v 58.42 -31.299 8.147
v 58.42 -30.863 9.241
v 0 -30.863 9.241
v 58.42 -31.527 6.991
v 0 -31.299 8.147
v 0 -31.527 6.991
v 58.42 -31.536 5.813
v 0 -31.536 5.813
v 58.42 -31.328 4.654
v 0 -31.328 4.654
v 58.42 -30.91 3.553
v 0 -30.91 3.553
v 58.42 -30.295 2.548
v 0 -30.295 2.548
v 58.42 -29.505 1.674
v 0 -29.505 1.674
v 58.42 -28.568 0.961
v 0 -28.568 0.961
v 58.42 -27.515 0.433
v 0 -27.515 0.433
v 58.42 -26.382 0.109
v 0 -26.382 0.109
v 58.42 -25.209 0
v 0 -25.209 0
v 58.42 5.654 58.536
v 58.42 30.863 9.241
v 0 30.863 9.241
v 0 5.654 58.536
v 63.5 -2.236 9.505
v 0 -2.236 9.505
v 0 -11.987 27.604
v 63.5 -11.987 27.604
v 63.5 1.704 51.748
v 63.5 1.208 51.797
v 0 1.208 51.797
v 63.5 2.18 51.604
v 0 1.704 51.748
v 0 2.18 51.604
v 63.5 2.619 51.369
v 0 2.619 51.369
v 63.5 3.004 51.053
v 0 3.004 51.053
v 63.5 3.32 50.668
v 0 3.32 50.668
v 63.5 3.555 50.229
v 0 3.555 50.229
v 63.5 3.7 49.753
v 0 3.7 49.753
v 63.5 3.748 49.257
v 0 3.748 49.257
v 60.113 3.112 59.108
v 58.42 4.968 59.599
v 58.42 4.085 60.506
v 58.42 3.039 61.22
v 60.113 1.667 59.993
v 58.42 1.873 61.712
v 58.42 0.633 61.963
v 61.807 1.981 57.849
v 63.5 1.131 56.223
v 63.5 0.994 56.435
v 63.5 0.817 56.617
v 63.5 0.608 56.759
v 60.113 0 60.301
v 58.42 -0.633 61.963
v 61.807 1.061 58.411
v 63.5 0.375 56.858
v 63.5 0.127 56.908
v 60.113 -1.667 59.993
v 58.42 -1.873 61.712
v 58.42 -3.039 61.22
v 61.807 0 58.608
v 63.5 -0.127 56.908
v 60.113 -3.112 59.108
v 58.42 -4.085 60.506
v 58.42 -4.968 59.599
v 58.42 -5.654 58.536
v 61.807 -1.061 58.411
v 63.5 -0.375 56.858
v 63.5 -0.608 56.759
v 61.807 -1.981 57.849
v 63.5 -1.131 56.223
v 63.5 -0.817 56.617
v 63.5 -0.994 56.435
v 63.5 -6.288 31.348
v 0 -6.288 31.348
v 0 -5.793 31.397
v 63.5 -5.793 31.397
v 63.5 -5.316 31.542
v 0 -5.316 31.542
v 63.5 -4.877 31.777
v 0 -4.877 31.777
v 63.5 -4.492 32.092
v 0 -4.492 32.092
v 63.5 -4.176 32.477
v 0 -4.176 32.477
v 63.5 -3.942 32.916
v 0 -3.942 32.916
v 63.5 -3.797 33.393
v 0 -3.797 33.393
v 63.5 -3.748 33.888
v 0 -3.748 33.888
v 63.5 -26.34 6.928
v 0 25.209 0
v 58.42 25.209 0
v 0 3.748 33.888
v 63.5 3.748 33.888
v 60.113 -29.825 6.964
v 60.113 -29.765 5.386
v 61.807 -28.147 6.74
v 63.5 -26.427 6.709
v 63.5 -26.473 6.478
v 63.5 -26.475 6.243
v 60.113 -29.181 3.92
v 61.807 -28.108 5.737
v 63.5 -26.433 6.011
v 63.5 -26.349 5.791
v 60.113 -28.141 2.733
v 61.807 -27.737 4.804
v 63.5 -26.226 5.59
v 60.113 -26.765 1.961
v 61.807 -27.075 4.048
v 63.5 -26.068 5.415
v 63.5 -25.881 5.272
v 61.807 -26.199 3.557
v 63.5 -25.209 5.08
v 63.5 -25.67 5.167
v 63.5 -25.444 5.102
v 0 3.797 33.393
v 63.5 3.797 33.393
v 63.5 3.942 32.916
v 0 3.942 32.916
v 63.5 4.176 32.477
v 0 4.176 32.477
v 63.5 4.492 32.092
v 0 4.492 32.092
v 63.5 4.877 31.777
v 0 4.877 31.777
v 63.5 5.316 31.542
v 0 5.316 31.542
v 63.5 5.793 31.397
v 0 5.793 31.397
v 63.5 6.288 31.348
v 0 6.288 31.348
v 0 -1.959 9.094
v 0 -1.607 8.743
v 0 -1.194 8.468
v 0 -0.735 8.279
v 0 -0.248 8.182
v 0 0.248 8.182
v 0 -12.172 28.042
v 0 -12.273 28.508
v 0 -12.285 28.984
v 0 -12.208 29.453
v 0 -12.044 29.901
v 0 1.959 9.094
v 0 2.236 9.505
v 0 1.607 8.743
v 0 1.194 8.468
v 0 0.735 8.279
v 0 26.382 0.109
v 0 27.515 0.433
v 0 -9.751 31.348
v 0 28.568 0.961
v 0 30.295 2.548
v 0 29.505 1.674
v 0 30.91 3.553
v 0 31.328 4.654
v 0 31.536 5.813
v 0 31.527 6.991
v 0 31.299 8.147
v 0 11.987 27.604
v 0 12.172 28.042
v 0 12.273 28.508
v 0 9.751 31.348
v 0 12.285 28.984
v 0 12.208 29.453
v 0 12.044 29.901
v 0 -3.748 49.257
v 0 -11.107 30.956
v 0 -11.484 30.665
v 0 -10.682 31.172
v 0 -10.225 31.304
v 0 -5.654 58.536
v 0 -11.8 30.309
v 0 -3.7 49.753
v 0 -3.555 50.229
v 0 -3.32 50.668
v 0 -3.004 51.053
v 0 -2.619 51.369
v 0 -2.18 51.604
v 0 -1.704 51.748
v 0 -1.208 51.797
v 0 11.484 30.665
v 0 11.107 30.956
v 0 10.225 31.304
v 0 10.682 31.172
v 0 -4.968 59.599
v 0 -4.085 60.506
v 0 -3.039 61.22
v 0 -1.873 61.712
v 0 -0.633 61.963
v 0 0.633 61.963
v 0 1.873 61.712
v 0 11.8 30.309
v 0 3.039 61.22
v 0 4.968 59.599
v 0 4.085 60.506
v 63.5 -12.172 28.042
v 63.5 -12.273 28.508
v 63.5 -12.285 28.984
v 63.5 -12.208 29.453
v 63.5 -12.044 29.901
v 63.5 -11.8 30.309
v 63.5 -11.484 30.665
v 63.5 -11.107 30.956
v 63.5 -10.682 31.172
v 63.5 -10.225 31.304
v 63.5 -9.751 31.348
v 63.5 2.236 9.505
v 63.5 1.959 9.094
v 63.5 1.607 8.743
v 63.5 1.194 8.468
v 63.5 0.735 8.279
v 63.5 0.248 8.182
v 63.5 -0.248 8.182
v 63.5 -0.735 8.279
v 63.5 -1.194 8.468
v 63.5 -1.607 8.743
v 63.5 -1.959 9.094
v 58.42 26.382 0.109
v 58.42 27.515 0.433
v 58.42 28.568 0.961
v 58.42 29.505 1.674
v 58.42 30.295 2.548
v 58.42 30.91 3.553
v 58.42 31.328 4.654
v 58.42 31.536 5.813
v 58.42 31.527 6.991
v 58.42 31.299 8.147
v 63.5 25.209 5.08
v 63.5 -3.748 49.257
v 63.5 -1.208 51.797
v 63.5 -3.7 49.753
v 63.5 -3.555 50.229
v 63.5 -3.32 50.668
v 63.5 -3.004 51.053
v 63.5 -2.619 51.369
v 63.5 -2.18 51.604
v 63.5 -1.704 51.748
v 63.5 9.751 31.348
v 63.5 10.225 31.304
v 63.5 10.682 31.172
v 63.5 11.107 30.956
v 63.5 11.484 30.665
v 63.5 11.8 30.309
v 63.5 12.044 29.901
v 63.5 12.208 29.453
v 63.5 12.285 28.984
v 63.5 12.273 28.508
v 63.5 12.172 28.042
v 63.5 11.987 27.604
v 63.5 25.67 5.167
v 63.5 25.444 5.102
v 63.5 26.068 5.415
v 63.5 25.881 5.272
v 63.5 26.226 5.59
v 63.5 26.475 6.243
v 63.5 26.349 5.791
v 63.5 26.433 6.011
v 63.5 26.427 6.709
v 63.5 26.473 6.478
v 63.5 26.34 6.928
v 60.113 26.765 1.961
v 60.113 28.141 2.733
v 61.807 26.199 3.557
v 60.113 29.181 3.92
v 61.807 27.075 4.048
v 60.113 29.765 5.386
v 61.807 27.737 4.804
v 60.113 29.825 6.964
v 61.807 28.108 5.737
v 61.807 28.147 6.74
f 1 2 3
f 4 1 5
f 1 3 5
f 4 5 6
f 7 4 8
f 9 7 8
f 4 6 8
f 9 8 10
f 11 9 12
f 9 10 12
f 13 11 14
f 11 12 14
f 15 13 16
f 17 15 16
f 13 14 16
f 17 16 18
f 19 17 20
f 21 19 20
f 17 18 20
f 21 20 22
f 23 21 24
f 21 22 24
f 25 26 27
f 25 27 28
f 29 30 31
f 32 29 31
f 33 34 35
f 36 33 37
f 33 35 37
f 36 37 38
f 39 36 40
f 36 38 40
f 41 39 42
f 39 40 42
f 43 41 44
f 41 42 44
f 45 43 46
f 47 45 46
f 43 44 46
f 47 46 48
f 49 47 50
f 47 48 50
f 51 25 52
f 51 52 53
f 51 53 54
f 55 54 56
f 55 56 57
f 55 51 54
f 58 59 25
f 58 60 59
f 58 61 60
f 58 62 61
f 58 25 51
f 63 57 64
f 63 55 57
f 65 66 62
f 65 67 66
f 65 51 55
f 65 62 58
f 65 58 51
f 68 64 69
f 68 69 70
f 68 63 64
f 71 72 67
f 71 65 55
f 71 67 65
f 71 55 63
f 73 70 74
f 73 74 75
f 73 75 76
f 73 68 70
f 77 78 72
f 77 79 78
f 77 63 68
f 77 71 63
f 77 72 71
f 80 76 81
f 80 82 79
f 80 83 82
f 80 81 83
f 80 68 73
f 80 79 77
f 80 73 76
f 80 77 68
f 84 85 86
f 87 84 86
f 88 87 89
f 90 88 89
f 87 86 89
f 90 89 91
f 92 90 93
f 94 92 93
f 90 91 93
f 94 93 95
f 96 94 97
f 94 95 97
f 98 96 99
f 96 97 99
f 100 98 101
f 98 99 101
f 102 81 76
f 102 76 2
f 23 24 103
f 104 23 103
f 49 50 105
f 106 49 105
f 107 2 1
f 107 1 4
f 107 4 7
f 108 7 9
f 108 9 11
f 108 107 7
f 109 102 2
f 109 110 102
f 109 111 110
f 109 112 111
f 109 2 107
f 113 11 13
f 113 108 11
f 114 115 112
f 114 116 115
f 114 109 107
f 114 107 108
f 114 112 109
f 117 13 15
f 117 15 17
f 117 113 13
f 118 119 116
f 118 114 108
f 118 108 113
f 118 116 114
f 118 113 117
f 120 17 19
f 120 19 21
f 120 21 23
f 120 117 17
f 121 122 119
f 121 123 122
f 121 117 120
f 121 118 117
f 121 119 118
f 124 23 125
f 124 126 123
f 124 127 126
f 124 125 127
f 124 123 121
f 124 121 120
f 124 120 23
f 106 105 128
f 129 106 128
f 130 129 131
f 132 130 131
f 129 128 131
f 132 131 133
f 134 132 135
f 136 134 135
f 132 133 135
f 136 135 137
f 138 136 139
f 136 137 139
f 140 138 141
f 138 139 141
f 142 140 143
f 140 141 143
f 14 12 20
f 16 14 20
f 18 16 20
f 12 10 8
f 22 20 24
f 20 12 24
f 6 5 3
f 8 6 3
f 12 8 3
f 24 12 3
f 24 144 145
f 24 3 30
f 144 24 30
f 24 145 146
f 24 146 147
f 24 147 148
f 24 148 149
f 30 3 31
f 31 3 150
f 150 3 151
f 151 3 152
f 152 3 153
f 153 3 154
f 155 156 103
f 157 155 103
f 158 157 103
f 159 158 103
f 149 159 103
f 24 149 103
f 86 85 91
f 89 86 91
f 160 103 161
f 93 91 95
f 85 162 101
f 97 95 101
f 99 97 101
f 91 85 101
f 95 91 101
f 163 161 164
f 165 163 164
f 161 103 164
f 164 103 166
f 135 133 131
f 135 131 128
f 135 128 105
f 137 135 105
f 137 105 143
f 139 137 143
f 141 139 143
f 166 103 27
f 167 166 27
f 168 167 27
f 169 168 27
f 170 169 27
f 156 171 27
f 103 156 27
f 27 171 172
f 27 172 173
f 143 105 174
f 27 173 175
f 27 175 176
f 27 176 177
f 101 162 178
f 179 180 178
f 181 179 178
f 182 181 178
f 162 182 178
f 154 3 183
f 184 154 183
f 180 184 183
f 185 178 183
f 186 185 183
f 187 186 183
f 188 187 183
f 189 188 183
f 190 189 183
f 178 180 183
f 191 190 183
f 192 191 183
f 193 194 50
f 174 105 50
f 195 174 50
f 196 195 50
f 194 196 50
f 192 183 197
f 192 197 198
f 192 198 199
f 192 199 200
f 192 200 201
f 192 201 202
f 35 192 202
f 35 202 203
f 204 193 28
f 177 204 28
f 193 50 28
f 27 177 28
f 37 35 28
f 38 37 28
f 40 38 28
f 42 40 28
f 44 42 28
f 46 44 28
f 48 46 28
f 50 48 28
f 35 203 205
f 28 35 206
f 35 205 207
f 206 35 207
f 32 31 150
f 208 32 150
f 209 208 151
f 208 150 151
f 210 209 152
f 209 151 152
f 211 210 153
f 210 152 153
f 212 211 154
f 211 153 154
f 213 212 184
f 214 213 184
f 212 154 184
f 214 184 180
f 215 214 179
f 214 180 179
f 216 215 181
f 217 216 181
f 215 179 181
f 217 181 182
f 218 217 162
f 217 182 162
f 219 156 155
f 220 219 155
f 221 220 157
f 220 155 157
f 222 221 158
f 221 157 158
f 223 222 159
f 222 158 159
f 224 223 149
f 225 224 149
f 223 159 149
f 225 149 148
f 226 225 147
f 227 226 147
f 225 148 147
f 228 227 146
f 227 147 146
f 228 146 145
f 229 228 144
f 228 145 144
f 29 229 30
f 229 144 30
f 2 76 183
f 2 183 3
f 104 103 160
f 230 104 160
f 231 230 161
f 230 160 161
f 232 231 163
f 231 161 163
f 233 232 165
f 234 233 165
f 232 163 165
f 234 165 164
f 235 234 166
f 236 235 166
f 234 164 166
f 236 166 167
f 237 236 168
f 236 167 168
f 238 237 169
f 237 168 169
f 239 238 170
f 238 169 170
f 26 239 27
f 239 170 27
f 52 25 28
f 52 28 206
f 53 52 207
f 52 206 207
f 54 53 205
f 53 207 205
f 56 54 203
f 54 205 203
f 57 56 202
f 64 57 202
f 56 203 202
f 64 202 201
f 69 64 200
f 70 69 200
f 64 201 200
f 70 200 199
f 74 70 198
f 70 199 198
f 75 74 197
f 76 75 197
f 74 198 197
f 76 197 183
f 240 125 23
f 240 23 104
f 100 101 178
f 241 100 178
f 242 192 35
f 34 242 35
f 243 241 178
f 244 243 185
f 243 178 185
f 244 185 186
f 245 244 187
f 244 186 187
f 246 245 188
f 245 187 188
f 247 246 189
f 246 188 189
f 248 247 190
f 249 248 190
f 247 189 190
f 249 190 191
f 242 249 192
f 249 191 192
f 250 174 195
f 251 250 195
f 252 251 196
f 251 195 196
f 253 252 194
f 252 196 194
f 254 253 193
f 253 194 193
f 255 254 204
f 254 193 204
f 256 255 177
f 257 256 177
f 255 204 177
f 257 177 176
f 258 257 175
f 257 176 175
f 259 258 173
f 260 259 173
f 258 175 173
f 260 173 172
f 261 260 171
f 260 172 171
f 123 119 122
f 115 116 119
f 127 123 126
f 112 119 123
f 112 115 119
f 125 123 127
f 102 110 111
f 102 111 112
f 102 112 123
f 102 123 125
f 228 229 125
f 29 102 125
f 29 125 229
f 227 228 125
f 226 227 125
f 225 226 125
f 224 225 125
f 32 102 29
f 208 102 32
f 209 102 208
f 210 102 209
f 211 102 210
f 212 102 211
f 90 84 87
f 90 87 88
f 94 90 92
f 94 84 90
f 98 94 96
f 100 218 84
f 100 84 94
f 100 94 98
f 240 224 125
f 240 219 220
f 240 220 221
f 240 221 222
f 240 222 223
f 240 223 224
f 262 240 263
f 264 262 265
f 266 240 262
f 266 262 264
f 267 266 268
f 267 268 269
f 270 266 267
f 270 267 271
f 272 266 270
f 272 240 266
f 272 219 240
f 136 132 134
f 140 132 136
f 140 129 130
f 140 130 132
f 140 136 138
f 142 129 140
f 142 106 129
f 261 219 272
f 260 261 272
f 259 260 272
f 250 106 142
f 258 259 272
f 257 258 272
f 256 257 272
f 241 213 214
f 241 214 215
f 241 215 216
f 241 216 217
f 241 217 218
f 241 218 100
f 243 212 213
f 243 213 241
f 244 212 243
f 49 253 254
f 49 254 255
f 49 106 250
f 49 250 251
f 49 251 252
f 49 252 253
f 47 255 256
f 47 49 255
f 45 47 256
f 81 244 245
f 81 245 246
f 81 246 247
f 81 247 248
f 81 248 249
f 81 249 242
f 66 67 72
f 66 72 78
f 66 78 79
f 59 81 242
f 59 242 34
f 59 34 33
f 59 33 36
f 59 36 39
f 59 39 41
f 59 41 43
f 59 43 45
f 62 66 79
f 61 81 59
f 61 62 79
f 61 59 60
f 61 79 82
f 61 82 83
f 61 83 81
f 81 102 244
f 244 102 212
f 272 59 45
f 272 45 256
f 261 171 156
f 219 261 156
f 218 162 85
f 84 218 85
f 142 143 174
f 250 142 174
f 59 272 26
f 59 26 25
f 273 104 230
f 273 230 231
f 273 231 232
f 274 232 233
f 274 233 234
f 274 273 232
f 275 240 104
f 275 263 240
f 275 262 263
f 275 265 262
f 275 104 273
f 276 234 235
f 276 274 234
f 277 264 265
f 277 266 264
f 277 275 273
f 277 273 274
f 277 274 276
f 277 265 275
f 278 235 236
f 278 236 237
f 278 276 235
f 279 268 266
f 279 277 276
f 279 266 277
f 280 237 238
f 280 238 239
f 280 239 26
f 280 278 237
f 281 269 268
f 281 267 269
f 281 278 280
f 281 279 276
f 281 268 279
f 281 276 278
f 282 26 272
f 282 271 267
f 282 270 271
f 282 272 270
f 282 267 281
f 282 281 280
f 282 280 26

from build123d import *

# Parameters (mm, degrees)
F1_DEPTH = 63.5
F2_SIZE  = 5.08


with BuildPart() as f1:
    # F0 (on Right) → F1 (new body)
    with BuildSketch(Plane.YZ):
        with BuildLine():
            ThreePointArc((-30.862735, 9.241248), (-30.625866, 3.03616), (-25.209136, 0))
            Line((-25.209136, 0), (25.209136, 0))
            ThreePointArc((25.209136, 0), (30.625866, 3.03616), (30.862735, 9.241248))
            Line((30.862735, 9.241248), (5.653599, 58.535651))
            ThreePointArc((5.653599, 58.535651), (0, 61.994403), (-5.653599, 58.535651))
            Line((-5.653599, 58.535651), (-30.862735, 9.241248))
        make_face()
        with BuildLine():
            ThreePointArc((2.236106, 9.505495), (0, 8.170248), (-2.236106, 9.505495))
            Line((-2.236106, 9.505495), (-11.986921, 27.603697))
            ThreePointArc((-11.986921, 27.603697), (-11.931603, 30.110665), (-9.750815, 31.348449))
            Line((-9.750815, 31.348449), (-6.28835, 31.348449))
            ThreePointArc((-6.28835, 31.348449), (-4.492299, 32.092398), (-3.74835, 33.888449))
            Line((-3.74835, 33.888449), (-3.74835, 49.257109))
            ThreePointArc((-3.74835, 49.257109), (-3.004401, 51.05316), (-1.20835, 51.797109))
            Line((-1.20835, 51.797109), (1.20835, 51.797109))
            ThreePointArc((1.20835, 51.797109), (3.004401, 51.05316), (3.74835, 49.257109))
            Line((3.74835, 49.257109), (3.74835, 33.888449))
            ThreePointArc((3.74835, 33.888449), (4.492299, 32.092398), (6.28835, 31.348449))
            Line((6.28835, 31.348449), (9.750815, 31.348449))
            ThreePointArc((9.750815, 31.348449), (11.931603, 30.110665), (11.986921, 27.603697))
            Line((11.986921, 27.603697), (2.236106, 9.505495))
        make_face(mode=Mode.SUBTRACT)
    extrude(amount=F1_DEPTH)

    # F2
    f2_edges = [f1.edges().sort_by_distance(p)[0] for p in [
        (63.5, 0, 0),
    ]]
    chamfer(f2_edges, length=F2_SIZE)


solid = f1.part
